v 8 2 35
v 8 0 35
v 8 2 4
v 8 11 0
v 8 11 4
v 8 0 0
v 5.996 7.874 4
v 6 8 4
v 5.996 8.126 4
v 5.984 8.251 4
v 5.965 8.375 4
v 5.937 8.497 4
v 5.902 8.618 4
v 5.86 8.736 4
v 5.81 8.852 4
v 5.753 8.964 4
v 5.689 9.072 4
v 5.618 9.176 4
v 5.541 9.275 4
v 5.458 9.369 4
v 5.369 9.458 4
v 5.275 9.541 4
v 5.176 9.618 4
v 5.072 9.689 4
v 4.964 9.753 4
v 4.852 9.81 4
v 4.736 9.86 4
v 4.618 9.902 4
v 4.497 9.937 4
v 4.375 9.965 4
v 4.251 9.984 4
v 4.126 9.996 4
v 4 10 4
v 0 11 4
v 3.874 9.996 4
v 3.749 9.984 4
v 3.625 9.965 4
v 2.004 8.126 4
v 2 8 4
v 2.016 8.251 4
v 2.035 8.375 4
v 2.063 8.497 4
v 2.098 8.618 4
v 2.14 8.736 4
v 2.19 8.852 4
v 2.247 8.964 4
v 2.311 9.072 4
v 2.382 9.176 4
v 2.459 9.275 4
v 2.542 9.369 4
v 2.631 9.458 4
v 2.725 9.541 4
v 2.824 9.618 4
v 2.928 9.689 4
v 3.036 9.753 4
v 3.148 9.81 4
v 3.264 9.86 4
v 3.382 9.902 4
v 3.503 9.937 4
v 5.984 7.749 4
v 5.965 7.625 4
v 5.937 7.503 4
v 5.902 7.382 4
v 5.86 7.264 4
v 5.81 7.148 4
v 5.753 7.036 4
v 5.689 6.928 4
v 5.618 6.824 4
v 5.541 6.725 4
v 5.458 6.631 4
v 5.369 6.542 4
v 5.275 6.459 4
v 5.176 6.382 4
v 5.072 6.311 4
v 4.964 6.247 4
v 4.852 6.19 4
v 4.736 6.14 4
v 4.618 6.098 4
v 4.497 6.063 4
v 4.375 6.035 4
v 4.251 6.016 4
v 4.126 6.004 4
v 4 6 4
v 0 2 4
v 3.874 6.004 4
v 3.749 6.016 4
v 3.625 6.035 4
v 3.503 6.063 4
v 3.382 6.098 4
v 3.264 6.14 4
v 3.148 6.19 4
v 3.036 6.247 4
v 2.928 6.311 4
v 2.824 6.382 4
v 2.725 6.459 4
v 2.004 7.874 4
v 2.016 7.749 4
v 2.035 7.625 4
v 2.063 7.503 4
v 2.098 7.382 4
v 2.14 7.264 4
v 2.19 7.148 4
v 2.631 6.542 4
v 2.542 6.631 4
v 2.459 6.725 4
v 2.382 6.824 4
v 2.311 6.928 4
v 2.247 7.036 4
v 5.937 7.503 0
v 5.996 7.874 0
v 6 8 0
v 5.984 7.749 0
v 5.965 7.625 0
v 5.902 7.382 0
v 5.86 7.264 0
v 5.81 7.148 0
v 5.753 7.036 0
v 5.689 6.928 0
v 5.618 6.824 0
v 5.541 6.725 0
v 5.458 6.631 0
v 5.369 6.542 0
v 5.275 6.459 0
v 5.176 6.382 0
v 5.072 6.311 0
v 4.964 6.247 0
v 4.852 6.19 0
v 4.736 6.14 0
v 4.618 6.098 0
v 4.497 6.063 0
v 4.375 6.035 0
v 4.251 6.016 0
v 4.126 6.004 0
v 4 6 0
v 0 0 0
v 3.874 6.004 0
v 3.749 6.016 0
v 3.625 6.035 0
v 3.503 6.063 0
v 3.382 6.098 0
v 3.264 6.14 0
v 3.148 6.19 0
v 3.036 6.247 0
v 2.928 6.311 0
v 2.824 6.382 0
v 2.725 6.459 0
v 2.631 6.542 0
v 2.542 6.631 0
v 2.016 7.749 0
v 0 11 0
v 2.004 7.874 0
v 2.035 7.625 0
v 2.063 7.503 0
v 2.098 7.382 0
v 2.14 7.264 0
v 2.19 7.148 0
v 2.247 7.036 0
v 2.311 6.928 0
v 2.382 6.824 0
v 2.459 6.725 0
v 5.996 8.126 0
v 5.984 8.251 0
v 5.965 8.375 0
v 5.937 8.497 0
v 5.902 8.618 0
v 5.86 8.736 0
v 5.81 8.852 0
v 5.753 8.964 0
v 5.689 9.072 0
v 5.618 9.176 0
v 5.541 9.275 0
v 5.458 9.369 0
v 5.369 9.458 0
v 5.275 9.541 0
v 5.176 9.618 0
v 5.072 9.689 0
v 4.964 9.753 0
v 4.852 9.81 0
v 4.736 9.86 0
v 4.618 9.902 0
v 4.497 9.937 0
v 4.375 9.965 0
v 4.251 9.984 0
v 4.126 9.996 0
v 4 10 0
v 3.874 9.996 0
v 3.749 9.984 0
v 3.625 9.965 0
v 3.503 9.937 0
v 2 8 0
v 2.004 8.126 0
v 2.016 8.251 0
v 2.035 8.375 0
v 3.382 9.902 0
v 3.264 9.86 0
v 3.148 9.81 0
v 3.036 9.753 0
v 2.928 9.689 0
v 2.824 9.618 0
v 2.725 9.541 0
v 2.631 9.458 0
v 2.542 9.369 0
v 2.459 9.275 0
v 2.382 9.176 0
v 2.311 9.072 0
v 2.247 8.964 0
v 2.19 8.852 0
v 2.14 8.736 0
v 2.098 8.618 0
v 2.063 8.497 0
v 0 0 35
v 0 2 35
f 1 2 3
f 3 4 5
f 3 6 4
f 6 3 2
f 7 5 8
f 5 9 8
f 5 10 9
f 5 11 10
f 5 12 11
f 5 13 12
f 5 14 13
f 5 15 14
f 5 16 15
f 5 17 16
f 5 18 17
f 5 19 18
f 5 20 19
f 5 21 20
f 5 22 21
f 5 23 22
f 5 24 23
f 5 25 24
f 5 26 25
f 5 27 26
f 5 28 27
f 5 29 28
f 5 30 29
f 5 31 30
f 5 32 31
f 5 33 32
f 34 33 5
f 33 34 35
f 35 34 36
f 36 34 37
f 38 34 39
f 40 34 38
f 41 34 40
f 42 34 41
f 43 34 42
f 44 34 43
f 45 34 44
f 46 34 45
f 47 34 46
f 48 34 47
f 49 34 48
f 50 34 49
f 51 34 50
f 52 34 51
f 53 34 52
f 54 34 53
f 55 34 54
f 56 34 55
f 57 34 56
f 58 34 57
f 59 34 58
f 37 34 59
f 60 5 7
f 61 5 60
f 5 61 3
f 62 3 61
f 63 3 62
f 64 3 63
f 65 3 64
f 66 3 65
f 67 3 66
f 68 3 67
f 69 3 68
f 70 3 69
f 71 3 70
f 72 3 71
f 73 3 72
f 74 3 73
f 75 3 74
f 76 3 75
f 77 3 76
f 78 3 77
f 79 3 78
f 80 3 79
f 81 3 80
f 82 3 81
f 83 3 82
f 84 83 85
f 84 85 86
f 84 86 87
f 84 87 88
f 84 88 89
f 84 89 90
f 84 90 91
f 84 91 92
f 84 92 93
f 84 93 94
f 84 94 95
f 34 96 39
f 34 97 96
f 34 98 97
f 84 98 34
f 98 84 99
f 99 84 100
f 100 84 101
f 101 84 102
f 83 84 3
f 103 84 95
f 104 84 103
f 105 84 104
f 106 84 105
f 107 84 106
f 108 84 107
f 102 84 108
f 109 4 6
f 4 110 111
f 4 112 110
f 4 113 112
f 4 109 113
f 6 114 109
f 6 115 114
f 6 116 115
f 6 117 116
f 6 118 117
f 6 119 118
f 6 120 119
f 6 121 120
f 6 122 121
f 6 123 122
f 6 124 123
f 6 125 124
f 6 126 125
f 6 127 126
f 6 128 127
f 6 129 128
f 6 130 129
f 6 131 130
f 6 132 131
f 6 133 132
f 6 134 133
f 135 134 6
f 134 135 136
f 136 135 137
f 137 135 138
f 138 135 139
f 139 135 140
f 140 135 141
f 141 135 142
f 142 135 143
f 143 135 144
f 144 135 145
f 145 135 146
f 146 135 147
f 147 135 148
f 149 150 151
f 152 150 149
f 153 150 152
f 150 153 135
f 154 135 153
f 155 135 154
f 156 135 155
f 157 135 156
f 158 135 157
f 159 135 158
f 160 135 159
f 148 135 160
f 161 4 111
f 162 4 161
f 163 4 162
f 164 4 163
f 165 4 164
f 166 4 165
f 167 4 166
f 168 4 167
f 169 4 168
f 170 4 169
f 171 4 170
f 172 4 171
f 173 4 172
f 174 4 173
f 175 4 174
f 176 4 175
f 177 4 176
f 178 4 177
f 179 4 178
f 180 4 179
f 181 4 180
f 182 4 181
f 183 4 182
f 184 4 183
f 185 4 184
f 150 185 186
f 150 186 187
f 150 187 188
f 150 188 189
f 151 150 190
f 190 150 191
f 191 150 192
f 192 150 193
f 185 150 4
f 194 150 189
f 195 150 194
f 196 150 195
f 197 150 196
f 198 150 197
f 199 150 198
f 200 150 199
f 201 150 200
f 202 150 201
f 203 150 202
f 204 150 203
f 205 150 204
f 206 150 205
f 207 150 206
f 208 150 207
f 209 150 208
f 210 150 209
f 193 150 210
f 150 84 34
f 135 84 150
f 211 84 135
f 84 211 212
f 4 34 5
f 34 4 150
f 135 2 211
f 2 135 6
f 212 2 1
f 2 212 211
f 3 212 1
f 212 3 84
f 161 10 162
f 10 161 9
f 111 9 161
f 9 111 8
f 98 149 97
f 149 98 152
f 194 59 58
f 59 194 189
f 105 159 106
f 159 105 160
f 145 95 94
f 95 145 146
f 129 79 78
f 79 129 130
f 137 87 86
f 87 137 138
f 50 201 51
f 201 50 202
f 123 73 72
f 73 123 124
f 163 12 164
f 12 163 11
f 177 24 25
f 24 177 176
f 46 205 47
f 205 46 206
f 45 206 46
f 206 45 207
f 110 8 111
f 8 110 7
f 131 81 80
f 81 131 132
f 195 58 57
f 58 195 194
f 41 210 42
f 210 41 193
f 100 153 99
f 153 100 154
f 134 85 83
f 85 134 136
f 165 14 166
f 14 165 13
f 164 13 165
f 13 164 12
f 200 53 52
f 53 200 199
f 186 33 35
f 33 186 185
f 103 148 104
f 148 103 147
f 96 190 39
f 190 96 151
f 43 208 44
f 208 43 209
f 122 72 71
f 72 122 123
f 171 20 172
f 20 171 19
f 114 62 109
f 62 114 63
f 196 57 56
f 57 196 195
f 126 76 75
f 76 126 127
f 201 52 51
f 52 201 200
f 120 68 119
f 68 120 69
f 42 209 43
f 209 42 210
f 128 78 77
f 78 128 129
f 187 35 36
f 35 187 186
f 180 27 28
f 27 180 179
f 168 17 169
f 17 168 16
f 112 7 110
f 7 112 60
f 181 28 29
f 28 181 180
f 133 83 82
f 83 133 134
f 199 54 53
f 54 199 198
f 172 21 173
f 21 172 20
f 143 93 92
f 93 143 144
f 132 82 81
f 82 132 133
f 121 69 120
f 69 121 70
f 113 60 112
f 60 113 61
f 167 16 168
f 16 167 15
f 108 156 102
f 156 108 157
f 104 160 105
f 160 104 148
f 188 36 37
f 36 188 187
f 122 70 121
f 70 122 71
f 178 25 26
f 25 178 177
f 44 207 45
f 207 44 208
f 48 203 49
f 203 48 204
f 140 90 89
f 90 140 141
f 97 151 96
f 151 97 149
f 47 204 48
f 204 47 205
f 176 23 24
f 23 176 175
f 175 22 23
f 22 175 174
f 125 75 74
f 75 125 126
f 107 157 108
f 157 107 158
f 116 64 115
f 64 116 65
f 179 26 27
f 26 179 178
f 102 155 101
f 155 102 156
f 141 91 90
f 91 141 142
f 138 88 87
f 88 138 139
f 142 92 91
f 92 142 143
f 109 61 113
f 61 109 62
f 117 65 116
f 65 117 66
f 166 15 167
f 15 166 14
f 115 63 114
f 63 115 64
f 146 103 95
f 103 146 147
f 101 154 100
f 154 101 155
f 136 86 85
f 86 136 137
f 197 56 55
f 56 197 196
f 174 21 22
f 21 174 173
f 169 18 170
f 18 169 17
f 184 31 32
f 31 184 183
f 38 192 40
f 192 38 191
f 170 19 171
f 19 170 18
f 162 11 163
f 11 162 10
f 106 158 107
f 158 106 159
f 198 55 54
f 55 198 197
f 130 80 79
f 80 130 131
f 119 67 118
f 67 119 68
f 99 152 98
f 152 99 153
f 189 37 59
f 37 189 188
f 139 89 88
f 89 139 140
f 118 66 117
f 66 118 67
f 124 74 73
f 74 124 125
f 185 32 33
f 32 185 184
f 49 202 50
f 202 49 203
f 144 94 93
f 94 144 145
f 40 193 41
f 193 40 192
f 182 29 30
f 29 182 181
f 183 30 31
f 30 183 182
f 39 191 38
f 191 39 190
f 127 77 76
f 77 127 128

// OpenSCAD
difference(){
	union(){

        translate([0,0,0]){
            cube([8,11,4], center=false);
        }         

        translate([0,0,0]){
            cube([8,2,35], center=false);
        }         
     

	}
	union() {
        translate([4,8,-10]){
            rotate([0,0,0]){
                cylinder(h=100, r=2, $fn=100, center=false);
            }
        }
      
	}
}
